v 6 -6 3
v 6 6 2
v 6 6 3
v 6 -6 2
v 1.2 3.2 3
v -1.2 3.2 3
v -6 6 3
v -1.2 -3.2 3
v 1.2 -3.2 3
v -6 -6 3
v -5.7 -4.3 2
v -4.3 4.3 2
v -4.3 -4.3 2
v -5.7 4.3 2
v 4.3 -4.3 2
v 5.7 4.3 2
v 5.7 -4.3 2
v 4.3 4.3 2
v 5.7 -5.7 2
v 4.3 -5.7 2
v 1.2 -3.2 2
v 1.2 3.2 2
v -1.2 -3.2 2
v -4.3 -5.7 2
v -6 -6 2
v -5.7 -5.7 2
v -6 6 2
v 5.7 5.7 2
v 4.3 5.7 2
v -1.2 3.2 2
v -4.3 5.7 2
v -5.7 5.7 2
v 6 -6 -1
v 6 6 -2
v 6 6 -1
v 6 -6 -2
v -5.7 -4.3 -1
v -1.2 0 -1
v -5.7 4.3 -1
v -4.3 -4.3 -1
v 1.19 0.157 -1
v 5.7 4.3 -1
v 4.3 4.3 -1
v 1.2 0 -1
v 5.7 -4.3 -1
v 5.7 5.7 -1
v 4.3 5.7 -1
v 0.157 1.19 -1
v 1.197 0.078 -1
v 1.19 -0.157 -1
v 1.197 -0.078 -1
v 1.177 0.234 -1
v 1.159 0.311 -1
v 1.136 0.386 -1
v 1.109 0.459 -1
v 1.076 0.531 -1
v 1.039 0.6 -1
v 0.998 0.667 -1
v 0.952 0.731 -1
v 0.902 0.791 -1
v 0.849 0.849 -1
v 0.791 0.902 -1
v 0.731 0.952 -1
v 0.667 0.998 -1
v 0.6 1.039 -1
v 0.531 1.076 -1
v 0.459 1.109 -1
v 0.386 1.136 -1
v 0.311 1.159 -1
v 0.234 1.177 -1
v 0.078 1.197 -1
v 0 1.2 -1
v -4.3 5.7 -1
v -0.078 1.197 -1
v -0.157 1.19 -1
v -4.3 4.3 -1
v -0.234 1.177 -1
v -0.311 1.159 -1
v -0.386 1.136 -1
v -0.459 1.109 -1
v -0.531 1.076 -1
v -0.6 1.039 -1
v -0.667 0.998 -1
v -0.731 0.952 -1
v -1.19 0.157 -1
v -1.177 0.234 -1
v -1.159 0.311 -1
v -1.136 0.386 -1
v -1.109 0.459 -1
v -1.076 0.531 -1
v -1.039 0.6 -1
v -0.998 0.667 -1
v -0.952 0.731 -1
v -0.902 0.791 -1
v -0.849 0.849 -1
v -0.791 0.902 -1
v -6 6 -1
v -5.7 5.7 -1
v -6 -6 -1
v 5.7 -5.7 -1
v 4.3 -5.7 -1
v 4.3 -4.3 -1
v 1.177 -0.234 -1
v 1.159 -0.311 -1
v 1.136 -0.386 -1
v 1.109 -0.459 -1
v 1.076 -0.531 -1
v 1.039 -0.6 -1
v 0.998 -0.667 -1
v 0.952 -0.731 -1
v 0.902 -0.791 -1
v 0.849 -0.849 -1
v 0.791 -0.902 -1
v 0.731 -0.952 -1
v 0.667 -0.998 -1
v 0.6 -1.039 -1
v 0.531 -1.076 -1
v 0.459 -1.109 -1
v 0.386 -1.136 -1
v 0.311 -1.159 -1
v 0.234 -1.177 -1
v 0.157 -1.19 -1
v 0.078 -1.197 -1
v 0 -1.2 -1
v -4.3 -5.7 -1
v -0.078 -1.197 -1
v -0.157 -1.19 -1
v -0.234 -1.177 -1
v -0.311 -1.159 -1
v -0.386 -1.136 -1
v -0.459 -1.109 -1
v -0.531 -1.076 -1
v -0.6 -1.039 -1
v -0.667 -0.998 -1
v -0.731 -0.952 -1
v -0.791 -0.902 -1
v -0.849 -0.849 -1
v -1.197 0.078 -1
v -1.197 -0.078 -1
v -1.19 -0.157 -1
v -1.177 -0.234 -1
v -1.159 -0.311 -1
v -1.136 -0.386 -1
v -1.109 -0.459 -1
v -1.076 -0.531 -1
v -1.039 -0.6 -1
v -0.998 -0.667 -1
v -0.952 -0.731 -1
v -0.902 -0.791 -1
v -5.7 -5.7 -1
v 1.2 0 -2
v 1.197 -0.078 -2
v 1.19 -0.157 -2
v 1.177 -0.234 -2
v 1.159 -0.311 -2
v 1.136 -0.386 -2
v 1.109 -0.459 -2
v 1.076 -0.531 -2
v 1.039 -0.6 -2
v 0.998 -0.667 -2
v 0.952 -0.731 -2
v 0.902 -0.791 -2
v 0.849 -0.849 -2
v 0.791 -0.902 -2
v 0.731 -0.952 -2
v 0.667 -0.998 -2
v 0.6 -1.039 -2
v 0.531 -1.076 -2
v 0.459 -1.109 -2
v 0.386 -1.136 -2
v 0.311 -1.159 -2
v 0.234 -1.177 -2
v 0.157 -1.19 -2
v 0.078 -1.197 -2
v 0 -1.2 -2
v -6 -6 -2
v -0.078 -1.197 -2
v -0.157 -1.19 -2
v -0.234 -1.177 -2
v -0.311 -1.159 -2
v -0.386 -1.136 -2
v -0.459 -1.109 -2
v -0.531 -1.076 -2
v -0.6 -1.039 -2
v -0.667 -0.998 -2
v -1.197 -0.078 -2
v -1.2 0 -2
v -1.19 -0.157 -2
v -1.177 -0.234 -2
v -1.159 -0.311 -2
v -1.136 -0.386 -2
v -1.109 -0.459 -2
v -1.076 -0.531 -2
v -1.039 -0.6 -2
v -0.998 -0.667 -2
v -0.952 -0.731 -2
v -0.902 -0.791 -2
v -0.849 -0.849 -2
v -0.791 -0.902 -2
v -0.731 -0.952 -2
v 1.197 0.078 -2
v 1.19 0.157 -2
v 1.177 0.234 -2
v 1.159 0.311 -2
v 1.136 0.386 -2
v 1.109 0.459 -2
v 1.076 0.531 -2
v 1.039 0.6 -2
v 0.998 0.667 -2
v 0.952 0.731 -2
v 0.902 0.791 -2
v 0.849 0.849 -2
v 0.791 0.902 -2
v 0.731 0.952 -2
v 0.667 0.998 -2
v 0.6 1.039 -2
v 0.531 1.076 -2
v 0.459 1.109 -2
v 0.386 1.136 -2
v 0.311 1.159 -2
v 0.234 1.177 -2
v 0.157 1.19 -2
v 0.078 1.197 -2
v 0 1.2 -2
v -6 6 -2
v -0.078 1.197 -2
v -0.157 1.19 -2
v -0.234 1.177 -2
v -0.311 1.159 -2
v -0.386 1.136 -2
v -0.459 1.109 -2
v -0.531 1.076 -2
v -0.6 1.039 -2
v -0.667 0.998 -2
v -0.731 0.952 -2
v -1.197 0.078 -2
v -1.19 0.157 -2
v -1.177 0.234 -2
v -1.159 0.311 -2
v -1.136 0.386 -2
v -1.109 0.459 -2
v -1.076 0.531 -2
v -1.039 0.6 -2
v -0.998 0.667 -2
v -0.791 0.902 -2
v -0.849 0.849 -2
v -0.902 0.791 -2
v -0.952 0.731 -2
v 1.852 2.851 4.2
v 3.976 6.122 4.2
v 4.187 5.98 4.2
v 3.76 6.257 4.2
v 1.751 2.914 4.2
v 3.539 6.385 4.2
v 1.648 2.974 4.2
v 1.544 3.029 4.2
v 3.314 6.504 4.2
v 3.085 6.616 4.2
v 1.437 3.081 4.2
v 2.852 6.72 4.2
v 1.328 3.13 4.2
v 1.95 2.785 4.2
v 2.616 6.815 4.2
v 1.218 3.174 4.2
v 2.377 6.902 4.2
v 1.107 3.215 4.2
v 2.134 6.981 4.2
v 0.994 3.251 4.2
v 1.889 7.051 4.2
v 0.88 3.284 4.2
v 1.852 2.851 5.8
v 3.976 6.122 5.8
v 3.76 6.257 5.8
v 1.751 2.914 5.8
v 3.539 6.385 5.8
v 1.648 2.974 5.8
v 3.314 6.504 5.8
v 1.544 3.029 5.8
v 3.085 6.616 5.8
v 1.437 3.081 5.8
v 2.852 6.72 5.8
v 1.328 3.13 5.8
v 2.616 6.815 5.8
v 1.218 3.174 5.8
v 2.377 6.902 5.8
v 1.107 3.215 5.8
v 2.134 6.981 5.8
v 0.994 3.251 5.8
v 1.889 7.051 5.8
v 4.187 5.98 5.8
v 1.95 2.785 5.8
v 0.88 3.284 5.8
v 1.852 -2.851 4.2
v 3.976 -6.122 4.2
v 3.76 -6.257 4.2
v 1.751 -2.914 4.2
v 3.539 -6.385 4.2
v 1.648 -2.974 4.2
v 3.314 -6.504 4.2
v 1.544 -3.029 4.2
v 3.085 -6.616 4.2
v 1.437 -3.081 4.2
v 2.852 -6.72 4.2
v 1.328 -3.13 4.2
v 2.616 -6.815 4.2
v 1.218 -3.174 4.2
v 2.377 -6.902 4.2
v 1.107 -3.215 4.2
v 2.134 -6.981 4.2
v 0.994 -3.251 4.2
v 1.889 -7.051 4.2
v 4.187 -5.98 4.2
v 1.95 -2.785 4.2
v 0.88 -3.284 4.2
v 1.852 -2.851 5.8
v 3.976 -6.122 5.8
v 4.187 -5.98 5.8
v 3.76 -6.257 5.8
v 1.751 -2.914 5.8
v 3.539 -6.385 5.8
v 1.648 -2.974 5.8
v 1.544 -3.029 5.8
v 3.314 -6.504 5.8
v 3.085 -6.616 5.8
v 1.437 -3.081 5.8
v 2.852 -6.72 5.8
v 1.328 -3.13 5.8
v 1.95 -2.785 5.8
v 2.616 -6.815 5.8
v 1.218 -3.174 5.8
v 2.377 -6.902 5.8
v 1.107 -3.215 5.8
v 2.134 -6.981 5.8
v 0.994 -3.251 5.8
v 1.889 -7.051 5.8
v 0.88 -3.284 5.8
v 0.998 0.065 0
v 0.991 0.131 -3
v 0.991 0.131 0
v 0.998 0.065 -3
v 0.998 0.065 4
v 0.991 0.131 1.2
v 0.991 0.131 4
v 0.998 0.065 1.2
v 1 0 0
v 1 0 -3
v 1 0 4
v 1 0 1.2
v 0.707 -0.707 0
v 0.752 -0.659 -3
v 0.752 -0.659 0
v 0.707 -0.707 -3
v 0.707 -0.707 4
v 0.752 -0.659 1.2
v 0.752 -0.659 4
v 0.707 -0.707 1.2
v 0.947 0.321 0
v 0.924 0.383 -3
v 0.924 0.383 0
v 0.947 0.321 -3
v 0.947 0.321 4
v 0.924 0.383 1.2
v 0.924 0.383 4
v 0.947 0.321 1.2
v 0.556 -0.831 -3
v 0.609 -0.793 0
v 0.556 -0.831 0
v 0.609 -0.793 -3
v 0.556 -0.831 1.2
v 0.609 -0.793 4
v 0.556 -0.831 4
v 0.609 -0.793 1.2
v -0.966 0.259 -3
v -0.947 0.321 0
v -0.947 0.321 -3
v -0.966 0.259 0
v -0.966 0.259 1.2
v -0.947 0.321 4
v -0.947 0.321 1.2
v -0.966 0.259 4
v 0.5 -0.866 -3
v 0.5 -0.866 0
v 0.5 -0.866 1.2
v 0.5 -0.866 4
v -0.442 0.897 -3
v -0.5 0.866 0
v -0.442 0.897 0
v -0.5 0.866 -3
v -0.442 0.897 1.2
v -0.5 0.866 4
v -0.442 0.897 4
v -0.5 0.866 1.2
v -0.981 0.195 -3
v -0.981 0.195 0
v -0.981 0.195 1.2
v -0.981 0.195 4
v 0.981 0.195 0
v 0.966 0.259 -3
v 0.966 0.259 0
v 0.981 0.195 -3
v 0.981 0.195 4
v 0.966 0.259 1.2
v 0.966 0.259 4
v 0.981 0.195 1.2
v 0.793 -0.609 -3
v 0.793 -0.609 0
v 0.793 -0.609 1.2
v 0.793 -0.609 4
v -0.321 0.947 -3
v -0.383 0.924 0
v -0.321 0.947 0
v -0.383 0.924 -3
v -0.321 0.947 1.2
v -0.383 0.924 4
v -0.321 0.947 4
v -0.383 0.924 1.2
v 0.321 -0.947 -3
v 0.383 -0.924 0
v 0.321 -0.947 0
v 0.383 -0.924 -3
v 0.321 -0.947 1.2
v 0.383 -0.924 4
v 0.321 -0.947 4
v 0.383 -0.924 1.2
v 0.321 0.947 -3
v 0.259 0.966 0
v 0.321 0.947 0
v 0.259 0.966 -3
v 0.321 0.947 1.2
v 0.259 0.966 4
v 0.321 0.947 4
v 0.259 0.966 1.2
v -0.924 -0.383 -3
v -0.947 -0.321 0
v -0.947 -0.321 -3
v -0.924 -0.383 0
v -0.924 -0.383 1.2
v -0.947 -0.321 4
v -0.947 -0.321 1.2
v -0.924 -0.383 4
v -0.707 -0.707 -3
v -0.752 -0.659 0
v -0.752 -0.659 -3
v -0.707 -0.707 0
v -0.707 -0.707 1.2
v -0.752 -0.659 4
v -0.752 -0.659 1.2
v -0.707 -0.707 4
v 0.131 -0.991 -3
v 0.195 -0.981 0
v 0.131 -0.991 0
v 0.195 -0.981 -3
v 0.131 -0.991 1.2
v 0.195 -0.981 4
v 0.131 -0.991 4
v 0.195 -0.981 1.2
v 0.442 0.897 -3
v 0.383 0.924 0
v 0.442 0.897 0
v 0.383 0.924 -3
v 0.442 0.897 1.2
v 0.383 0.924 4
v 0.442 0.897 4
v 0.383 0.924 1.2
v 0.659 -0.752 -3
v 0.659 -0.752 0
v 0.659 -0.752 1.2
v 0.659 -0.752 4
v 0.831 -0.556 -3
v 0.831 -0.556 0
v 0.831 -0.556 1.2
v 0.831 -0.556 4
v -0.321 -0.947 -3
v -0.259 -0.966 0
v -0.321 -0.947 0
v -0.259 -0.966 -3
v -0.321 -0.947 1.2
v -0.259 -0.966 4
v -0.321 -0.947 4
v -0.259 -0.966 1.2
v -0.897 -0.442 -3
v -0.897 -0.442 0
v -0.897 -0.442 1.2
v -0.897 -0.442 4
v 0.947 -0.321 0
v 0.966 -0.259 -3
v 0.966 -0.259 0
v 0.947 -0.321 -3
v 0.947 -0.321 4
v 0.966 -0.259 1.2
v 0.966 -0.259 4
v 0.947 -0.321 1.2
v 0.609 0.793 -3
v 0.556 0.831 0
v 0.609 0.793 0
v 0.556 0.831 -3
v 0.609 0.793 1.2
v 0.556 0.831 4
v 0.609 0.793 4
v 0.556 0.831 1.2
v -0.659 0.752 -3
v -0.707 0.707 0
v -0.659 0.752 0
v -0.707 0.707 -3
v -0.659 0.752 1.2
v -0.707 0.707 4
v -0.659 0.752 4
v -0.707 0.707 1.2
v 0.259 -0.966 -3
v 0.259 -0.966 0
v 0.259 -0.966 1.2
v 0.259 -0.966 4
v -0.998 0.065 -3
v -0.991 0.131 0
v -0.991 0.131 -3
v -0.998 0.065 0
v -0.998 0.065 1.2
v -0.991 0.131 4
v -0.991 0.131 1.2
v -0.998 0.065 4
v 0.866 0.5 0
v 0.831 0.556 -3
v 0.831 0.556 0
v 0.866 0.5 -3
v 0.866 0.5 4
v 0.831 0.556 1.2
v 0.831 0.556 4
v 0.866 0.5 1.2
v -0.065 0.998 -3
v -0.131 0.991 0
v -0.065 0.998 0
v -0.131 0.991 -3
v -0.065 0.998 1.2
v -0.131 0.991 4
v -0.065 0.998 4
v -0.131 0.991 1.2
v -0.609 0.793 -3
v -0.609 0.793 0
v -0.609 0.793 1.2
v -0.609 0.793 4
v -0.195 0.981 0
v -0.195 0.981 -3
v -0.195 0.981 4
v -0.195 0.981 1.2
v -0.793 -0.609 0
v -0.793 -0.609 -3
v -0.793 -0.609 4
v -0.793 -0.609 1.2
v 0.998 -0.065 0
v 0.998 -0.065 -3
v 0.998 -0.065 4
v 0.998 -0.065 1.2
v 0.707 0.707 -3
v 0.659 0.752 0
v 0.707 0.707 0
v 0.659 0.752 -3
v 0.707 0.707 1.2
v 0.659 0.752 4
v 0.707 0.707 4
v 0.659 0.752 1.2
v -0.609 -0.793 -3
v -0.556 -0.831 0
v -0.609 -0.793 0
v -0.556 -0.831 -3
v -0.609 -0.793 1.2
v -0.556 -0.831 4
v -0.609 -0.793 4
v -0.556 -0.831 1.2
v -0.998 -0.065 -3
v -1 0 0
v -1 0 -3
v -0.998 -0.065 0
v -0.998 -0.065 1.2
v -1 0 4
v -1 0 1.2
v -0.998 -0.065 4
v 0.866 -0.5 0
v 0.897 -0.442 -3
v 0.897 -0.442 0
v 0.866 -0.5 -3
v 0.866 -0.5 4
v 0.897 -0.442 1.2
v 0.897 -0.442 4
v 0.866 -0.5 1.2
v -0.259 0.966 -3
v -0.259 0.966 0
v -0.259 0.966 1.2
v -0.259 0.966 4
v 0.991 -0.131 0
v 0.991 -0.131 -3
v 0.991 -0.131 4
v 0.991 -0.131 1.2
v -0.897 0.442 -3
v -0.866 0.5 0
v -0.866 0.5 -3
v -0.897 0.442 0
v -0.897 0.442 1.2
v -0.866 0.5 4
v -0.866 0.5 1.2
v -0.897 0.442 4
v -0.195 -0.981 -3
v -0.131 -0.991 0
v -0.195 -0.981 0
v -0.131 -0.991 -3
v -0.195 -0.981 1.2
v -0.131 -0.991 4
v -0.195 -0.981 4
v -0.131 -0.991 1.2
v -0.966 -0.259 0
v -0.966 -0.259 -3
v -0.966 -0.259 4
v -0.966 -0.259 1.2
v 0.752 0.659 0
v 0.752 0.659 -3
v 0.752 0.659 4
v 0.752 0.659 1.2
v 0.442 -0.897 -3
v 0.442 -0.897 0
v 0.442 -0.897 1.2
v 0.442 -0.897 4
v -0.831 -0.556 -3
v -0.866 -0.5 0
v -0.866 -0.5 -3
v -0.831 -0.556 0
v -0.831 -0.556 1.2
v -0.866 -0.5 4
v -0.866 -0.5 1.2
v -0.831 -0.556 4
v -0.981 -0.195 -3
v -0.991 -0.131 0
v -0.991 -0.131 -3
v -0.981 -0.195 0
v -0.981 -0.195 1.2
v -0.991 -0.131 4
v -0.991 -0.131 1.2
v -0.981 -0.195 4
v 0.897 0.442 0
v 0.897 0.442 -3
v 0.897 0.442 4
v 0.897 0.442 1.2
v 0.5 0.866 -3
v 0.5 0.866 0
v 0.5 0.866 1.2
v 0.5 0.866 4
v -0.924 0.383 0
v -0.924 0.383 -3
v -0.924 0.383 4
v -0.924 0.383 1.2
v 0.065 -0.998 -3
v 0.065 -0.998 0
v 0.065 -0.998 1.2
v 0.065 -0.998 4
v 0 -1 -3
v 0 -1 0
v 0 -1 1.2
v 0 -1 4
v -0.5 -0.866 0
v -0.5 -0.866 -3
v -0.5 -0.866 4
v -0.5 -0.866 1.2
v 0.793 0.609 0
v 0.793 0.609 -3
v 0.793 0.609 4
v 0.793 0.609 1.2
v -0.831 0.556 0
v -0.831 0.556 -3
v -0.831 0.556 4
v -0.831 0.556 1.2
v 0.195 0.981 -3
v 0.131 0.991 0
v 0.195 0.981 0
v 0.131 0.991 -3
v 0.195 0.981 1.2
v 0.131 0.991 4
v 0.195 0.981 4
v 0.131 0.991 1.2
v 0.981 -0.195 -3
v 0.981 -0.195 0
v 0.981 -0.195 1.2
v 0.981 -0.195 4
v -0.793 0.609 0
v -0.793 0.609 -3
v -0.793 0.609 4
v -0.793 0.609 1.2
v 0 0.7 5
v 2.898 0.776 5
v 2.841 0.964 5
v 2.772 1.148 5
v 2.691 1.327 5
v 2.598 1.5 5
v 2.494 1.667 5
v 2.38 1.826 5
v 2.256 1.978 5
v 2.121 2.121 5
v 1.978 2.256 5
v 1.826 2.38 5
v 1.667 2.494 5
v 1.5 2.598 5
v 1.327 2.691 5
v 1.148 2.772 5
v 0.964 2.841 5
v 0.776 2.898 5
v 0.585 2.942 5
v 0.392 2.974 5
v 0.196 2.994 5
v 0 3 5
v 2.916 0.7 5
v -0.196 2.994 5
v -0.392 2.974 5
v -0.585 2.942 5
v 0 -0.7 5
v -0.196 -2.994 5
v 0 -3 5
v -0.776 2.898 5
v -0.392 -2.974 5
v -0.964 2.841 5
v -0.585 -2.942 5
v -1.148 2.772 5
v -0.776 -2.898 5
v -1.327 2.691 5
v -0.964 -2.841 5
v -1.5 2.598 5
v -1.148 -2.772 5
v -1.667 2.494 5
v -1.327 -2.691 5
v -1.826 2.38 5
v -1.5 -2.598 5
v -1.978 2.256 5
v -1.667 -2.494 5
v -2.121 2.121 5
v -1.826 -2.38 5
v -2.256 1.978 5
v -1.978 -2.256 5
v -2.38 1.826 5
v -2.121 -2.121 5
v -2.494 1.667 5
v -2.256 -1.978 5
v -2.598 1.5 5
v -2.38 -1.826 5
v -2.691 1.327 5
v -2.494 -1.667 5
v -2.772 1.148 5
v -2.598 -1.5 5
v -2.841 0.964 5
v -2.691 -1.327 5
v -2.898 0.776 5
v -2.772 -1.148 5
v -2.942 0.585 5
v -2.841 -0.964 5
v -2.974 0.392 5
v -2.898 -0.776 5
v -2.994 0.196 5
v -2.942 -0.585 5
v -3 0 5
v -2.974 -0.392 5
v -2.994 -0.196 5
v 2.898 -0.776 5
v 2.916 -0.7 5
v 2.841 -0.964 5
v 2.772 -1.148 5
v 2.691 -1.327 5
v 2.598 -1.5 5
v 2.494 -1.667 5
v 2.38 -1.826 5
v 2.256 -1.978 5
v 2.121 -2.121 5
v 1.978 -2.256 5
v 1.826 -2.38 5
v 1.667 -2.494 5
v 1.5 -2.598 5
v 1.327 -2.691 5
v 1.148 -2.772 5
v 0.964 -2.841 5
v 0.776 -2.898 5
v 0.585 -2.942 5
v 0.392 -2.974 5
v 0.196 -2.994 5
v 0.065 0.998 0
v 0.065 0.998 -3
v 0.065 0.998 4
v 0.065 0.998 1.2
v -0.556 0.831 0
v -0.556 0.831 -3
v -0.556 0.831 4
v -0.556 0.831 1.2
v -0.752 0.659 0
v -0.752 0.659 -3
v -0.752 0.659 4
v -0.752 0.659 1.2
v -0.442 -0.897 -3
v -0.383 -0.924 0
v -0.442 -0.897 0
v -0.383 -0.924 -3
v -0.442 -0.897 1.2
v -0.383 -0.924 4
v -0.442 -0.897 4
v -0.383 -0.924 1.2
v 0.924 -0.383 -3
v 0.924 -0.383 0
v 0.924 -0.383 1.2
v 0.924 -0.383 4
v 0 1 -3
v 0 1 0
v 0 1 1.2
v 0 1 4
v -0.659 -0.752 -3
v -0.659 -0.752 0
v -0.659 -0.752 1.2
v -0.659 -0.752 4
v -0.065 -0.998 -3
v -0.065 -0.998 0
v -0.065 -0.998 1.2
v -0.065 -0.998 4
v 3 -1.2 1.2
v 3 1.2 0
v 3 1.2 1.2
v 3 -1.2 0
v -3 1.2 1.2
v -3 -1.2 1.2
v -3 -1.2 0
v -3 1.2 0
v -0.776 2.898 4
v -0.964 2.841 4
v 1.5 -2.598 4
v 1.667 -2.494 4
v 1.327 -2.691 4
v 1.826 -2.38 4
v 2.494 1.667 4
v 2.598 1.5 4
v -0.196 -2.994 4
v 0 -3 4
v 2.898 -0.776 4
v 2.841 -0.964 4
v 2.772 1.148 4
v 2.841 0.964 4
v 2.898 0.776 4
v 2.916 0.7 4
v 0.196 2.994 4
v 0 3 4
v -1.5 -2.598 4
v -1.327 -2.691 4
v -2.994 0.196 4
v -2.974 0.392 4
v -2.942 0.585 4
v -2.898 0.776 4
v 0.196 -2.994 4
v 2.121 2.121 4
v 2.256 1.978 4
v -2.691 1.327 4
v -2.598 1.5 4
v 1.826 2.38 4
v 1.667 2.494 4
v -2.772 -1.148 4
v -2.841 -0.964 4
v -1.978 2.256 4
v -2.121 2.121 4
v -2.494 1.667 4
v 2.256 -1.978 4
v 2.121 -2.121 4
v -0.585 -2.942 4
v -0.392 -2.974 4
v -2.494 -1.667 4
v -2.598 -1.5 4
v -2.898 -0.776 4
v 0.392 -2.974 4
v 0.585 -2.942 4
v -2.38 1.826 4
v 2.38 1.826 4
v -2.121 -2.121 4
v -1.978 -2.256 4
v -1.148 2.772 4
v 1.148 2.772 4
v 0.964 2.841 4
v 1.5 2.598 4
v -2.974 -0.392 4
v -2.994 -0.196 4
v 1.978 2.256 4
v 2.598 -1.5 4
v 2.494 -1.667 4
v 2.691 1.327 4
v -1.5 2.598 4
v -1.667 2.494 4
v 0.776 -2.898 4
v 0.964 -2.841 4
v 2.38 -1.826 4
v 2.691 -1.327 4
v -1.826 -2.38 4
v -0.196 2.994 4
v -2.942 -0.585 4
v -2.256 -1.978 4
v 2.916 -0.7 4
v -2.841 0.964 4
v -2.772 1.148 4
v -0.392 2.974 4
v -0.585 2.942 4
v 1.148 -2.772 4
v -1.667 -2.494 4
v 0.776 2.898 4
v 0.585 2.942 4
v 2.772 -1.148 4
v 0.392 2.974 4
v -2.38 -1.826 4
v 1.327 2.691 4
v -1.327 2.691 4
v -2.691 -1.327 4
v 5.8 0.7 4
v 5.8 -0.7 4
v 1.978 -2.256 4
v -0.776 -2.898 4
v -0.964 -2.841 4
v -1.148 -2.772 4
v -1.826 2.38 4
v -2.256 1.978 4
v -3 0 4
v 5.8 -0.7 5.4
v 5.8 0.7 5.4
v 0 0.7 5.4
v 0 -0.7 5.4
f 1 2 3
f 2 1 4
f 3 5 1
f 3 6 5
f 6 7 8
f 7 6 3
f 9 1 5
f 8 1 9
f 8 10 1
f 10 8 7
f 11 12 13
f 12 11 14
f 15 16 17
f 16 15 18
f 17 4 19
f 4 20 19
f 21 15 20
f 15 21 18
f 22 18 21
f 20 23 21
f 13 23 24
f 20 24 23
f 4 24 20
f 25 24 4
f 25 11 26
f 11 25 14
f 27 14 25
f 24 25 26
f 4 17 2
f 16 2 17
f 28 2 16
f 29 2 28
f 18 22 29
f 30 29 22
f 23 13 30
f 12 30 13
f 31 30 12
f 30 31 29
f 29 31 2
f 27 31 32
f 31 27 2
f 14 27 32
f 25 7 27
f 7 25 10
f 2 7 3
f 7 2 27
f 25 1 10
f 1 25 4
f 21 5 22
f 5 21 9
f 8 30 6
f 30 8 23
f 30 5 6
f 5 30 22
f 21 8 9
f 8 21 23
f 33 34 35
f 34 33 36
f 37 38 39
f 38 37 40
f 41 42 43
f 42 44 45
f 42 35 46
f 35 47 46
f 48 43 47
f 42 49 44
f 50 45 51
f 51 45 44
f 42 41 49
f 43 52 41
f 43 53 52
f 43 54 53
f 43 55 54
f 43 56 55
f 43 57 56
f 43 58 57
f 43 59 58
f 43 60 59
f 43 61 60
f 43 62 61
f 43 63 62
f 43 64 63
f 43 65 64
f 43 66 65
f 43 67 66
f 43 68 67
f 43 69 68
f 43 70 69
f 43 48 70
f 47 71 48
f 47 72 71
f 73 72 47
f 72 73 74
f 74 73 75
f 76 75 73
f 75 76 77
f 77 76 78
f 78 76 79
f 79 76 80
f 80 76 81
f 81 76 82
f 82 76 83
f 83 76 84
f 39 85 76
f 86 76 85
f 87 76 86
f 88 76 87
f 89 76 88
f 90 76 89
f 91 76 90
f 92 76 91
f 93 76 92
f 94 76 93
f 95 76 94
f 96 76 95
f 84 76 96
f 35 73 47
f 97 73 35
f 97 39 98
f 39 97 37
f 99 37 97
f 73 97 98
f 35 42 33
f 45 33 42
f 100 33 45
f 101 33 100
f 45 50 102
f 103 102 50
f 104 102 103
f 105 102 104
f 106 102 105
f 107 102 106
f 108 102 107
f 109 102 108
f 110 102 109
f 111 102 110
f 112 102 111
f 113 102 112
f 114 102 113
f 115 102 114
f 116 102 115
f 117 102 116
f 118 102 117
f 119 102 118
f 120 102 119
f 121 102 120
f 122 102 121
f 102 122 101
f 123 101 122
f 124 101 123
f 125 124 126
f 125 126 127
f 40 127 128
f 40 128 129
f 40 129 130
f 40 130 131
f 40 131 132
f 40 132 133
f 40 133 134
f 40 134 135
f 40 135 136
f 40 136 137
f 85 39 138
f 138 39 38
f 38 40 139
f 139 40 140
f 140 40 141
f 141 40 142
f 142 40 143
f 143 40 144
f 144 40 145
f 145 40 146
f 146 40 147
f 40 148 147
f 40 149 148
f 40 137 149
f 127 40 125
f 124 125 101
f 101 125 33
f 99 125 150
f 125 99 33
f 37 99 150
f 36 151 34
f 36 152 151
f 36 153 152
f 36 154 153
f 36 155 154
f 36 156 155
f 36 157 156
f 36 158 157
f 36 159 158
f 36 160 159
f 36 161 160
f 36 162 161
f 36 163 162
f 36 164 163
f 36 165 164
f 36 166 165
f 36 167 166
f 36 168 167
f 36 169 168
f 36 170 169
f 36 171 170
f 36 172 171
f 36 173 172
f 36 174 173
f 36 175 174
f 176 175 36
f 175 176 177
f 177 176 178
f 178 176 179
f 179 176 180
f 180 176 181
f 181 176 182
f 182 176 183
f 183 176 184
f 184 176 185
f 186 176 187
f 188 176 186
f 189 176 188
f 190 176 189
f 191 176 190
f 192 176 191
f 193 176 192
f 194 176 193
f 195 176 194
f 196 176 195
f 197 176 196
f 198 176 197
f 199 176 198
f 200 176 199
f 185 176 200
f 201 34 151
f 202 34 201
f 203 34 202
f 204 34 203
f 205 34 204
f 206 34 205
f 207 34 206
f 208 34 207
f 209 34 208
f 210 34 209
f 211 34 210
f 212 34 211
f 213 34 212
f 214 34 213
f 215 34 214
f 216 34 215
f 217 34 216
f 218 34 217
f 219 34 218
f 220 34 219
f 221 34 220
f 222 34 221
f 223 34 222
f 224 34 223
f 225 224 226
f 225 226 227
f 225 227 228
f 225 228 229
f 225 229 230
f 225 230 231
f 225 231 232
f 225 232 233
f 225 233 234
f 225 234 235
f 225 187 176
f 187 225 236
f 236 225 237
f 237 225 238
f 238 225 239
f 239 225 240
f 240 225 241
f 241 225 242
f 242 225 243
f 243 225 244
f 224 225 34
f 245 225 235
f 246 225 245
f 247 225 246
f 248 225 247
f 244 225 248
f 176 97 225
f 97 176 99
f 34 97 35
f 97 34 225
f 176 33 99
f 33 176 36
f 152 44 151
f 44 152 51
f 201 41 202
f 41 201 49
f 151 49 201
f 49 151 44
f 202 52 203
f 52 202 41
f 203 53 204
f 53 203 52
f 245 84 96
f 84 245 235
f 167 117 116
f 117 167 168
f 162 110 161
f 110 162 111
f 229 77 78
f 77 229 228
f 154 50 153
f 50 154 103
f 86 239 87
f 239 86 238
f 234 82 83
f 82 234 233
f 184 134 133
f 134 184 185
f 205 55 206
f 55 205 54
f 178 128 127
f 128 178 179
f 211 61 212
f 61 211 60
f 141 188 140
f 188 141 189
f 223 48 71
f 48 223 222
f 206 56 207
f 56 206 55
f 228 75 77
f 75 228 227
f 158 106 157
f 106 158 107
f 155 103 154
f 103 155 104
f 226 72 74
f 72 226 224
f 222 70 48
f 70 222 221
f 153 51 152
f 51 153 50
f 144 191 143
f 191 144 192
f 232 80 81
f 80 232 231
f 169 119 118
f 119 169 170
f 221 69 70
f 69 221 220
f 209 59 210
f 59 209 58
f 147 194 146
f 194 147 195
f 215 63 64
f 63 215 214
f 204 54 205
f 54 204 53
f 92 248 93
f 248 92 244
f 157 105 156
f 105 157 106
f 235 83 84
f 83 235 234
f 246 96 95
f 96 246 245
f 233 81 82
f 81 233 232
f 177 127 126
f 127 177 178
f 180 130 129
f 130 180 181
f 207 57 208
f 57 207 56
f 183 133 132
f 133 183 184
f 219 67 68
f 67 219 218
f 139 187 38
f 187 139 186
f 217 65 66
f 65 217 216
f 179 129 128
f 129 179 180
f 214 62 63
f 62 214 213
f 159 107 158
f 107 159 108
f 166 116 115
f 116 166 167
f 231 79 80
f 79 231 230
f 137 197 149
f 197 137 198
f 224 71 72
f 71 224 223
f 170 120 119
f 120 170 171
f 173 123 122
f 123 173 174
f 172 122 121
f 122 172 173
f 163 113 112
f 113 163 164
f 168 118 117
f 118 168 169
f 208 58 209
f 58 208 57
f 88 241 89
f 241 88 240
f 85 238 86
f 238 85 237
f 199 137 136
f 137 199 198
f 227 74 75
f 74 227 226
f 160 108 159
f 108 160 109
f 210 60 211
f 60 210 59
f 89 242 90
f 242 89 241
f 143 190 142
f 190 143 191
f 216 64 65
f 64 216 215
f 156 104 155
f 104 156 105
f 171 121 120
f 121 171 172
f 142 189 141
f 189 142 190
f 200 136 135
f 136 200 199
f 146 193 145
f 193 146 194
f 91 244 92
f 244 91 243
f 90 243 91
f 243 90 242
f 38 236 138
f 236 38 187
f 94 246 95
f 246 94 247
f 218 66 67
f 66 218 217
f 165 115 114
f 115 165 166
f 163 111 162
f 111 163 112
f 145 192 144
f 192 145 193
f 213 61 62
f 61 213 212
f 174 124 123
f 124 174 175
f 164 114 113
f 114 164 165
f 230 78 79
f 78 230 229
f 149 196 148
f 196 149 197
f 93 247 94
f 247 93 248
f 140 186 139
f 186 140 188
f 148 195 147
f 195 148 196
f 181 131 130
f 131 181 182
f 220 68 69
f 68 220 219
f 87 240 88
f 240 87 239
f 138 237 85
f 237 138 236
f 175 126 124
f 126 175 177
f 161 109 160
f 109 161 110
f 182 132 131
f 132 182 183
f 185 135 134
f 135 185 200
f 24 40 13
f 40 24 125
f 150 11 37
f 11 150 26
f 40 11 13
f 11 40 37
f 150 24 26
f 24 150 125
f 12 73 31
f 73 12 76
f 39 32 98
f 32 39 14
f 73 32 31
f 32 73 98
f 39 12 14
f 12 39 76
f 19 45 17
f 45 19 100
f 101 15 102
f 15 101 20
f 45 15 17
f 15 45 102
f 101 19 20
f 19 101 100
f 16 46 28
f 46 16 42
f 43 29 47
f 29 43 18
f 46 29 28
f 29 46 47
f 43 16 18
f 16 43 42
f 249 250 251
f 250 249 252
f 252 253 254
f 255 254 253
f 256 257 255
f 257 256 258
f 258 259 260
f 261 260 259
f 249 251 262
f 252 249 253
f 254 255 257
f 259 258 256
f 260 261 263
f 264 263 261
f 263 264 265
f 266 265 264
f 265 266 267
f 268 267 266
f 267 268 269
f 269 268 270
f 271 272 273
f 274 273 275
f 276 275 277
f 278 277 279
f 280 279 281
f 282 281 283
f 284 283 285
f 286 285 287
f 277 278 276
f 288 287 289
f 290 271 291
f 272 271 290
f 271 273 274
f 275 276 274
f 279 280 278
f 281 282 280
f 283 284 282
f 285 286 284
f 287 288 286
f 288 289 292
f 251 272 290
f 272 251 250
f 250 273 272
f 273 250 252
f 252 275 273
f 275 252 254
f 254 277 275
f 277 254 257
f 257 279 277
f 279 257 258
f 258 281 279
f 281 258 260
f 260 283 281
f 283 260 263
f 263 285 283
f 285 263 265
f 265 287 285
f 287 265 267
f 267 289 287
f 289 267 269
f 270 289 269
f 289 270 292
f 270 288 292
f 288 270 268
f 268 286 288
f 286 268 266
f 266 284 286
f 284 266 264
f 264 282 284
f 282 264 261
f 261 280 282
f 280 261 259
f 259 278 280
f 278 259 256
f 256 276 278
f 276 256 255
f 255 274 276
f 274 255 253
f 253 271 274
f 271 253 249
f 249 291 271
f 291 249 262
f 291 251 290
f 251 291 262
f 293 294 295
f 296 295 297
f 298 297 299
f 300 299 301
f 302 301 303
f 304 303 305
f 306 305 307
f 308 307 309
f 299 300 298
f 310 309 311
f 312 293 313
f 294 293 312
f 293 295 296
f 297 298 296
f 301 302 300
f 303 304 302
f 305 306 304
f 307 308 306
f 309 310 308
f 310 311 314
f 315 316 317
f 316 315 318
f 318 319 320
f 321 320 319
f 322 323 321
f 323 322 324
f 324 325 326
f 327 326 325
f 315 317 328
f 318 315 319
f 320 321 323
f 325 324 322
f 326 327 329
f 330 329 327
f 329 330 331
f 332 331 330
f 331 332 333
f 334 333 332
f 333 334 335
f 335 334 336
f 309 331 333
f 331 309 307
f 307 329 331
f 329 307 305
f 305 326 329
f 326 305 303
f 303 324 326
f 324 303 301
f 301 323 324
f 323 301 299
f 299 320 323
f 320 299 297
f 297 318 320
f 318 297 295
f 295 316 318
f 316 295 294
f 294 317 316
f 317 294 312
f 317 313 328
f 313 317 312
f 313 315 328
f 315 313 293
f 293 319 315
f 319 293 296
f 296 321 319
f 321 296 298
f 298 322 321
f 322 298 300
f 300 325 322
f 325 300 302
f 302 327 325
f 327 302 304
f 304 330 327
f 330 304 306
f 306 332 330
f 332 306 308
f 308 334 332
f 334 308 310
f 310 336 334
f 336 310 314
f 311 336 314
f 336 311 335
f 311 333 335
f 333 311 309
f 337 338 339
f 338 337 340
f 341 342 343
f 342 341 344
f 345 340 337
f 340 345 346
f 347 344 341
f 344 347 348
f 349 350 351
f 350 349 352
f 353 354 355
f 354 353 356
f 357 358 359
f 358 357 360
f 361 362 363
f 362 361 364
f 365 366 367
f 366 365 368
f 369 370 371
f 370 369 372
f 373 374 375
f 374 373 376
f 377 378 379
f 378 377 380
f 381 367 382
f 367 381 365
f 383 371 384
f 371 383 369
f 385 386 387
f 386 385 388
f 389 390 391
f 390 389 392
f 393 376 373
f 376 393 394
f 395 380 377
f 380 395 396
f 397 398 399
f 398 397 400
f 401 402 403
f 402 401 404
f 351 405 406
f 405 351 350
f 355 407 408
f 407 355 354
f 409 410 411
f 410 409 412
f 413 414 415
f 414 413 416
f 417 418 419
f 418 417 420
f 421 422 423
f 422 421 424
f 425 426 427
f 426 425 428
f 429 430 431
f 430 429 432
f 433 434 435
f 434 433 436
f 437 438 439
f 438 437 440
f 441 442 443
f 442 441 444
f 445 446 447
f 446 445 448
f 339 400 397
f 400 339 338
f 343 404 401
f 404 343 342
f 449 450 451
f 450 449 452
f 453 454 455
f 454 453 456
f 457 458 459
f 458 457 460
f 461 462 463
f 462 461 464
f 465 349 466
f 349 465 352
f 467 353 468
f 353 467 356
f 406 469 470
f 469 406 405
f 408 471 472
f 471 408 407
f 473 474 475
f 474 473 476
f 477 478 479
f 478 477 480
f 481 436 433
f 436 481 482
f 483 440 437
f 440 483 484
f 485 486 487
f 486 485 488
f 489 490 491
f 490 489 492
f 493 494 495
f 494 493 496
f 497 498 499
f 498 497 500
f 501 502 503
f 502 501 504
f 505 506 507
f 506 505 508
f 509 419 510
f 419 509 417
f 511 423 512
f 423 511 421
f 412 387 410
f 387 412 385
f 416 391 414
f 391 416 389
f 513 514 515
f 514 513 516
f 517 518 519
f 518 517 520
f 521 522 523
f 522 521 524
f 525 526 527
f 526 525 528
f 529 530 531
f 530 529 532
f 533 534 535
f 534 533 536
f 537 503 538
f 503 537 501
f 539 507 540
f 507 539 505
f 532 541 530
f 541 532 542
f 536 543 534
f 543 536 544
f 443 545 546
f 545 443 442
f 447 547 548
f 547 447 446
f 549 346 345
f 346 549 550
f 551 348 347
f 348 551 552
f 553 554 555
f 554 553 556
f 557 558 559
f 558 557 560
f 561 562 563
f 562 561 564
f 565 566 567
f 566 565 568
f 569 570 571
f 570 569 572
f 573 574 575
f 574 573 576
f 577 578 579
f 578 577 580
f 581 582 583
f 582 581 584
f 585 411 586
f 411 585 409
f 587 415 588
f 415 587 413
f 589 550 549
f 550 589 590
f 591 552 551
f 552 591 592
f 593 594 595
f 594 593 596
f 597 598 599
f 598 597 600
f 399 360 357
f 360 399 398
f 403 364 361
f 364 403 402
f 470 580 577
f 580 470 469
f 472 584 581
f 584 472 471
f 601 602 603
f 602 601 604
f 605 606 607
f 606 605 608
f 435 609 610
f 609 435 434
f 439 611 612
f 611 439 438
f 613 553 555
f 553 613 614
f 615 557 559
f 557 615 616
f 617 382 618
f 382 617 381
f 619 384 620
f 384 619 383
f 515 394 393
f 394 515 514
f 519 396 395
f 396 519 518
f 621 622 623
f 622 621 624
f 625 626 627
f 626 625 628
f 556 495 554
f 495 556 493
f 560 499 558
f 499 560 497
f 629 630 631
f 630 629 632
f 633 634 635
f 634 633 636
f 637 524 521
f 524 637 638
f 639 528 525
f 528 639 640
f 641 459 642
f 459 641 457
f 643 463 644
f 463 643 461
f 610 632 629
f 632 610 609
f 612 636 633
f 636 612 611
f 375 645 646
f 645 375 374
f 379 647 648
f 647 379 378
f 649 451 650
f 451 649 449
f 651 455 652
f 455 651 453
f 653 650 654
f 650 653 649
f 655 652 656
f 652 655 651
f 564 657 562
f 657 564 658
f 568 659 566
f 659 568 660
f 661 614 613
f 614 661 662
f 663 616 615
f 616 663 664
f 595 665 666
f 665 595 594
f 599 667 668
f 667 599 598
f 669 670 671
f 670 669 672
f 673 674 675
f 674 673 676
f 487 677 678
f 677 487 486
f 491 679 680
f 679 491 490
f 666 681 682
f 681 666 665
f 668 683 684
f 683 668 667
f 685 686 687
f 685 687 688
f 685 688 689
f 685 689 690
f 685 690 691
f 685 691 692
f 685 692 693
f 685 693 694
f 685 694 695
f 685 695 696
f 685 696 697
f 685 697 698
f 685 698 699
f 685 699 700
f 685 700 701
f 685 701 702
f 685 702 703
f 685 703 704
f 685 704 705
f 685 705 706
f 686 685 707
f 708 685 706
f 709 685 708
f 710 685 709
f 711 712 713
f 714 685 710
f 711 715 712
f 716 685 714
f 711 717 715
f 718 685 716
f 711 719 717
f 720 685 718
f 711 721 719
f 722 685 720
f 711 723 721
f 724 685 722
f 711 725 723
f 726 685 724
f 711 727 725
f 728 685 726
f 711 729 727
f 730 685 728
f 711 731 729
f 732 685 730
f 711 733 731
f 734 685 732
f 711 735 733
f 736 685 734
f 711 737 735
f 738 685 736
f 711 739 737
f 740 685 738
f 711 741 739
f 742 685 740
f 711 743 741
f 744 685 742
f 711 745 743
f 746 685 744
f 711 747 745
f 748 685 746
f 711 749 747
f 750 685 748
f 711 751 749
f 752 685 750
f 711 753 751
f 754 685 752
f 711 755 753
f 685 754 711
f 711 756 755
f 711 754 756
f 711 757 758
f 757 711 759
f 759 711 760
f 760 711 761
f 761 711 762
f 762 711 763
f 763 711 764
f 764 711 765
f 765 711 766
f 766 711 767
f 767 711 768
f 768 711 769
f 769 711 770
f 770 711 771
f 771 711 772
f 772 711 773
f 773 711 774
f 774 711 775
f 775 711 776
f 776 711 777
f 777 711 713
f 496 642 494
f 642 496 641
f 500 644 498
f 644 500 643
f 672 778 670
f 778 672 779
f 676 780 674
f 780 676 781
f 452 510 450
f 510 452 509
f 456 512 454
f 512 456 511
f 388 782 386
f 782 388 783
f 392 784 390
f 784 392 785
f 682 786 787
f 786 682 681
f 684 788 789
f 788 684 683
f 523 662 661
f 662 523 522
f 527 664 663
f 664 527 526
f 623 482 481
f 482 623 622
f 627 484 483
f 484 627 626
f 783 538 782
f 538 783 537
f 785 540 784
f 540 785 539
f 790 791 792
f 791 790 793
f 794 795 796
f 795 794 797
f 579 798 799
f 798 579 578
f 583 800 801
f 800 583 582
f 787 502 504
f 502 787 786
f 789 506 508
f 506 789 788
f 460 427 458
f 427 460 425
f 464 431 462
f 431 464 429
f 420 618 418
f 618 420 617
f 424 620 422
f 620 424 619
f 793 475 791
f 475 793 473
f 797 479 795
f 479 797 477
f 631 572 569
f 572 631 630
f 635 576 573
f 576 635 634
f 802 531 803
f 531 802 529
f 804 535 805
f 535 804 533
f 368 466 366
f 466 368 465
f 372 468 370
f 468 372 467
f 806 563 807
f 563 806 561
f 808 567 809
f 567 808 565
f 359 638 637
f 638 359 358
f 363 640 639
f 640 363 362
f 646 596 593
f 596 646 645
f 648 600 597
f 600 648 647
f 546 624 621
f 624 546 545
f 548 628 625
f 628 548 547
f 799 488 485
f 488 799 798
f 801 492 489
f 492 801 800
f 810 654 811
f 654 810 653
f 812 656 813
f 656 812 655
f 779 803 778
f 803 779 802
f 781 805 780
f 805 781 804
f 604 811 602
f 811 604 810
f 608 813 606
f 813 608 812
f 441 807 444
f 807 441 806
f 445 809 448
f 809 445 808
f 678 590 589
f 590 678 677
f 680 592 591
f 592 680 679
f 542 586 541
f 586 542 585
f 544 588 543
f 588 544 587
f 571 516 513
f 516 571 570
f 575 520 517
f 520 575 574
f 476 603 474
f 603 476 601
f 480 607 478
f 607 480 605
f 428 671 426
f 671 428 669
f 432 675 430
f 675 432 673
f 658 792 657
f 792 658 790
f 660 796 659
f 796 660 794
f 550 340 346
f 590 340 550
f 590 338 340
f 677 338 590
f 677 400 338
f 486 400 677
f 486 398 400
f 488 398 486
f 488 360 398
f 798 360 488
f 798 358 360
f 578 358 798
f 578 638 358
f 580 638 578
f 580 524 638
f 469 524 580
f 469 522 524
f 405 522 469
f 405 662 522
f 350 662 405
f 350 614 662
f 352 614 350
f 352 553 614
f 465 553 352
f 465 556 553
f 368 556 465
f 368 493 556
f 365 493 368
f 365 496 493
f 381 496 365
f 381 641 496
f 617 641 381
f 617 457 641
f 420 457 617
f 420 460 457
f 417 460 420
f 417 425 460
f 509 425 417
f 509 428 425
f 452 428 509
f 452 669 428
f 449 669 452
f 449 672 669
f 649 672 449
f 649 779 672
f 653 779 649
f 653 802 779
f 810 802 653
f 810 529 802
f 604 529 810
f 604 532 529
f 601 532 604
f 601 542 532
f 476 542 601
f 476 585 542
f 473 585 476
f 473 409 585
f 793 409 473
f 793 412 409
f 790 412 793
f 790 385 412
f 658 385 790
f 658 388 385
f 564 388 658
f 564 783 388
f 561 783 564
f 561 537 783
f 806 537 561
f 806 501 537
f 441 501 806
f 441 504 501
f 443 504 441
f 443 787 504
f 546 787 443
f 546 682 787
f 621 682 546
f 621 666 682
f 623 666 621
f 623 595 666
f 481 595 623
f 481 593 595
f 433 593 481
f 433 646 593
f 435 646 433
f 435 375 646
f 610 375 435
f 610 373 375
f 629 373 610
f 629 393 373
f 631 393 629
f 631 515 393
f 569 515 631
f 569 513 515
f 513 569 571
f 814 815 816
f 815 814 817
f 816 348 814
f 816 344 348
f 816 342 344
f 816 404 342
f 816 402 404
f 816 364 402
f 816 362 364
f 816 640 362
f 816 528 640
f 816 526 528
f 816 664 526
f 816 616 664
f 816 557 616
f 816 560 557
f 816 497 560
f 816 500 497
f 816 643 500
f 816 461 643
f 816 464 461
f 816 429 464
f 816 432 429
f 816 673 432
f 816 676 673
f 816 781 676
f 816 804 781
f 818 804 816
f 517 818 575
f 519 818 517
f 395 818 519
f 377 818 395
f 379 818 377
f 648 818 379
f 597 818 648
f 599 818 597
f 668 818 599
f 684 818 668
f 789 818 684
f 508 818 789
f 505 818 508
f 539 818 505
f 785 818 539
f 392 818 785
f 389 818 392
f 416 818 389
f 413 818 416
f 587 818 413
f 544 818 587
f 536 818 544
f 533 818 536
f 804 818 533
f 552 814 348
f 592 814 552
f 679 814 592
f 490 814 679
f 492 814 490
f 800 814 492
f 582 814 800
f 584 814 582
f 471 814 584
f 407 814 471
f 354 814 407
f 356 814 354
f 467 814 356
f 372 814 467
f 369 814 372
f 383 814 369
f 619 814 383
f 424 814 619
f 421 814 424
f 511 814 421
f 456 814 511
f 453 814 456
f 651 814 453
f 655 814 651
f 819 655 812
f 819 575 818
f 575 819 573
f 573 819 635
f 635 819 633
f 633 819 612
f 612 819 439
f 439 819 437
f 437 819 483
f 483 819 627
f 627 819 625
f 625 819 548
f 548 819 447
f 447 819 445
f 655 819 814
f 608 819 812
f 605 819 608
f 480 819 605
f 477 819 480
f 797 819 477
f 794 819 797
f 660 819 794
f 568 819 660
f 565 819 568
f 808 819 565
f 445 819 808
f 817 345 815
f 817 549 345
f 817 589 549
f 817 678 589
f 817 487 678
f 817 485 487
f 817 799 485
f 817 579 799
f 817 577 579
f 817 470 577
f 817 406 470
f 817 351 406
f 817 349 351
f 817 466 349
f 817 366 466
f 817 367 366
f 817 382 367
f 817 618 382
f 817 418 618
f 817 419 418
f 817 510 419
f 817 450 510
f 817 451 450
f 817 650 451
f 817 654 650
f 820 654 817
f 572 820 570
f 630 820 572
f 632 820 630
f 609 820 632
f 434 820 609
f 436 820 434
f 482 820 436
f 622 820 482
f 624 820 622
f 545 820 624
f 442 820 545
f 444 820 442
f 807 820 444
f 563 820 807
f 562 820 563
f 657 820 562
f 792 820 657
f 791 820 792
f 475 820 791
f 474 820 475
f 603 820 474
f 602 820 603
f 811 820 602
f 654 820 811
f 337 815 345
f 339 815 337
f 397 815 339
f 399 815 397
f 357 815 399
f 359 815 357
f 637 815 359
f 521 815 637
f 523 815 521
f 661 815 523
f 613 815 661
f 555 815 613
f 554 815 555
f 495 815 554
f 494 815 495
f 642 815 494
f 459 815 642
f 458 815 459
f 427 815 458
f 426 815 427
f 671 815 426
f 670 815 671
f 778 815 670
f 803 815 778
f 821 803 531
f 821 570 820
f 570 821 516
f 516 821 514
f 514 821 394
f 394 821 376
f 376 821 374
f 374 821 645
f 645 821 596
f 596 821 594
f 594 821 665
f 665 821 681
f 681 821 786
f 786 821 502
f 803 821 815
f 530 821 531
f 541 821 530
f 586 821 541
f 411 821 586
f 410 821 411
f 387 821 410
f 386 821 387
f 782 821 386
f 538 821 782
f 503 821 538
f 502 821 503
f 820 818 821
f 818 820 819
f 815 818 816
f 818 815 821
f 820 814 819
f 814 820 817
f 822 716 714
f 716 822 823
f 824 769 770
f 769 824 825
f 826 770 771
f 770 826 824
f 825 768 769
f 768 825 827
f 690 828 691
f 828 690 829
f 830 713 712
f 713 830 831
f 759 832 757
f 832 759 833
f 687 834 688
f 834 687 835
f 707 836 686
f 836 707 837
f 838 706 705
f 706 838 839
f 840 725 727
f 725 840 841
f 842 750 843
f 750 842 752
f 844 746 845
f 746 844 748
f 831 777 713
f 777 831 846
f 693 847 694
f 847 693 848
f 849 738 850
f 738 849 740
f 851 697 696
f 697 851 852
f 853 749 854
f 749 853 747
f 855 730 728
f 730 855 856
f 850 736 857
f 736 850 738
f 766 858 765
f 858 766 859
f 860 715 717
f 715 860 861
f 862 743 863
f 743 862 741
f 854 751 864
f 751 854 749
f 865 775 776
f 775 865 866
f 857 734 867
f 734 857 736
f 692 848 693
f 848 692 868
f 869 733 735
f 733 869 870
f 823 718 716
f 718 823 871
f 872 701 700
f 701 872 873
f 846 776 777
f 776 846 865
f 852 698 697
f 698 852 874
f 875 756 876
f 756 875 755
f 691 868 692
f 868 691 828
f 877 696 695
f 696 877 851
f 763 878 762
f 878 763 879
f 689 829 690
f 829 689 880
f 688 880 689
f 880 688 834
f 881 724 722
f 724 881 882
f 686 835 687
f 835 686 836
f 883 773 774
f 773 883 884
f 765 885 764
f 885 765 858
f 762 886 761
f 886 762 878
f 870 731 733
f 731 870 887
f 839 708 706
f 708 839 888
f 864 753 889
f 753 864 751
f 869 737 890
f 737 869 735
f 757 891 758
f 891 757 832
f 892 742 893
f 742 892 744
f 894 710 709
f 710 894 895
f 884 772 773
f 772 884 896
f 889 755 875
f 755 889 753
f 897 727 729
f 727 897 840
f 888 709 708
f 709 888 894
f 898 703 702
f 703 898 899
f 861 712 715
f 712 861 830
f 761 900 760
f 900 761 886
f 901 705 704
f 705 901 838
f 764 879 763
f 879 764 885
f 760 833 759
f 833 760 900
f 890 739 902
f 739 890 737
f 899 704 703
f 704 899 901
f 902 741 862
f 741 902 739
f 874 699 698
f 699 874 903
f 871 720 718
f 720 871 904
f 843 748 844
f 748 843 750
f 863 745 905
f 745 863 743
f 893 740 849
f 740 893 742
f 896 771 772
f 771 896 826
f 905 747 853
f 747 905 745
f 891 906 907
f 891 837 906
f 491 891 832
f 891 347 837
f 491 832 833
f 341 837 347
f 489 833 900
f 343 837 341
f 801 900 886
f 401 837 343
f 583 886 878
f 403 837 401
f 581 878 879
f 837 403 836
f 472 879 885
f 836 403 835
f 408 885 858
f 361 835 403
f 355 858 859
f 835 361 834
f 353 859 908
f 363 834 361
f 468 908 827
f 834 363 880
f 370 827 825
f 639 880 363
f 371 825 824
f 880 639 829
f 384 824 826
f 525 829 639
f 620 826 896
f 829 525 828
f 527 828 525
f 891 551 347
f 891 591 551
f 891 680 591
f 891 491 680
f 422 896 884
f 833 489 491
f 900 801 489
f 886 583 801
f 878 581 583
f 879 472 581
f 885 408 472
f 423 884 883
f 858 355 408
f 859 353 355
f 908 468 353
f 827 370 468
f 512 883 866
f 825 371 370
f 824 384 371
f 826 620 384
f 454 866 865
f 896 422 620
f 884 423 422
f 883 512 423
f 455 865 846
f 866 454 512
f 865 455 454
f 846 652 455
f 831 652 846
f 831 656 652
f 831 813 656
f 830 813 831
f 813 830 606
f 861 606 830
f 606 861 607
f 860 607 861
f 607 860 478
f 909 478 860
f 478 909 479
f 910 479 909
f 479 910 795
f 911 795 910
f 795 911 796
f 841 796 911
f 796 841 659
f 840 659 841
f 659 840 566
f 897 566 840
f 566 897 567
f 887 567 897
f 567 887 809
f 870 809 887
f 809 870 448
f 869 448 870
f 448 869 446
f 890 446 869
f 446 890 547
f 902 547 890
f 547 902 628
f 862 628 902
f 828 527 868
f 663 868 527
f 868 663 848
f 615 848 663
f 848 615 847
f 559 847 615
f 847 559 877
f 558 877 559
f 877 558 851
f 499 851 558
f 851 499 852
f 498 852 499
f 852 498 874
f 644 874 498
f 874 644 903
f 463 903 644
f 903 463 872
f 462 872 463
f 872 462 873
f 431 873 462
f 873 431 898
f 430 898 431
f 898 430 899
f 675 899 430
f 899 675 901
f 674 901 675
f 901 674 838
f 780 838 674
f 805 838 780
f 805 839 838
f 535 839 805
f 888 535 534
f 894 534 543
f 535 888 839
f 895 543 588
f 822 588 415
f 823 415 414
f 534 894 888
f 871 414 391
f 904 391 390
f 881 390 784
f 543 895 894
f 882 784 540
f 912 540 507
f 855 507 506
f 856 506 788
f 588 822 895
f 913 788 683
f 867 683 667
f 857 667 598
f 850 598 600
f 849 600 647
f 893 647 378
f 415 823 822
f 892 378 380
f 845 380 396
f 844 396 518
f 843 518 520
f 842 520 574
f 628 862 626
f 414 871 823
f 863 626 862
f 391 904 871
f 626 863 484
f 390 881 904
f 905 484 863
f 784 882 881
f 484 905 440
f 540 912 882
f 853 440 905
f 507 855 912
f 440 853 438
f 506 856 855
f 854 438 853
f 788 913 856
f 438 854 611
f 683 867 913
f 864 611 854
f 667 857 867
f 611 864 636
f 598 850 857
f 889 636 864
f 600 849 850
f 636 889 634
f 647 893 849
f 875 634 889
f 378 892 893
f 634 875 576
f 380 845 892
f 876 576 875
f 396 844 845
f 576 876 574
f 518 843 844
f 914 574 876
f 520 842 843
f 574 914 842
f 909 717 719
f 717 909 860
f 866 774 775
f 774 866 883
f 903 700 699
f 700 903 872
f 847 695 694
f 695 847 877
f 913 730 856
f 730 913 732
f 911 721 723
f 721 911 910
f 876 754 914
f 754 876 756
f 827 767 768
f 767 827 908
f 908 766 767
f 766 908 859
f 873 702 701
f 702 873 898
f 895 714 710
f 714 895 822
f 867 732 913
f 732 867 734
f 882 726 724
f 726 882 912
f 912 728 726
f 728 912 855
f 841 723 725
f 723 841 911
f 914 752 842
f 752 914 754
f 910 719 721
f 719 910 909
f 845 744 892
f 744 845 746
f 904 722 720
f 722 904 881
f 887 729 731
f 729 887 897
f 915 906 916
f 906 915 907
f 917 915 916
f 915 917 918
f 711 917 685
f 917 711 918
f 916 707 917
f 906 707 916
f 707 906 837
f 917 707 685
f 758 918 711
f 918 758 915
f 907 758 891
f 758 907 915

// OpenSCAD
// Two-piece detachable hinge — original geometry, OpenSCAD primitives only.
// Units: mm. Axes: world Z = rotation axis.
//
// Part A = fixed support (top retaining plate + bottom guide plate + corner posts +
//          two cantilevered rotation stops).
// Part B = one-piece rotor (shaft + lower cross-key + upper disc + handle).
//
// FDM is only a tentative process. Material, machine tolerance, holding load,
// friction, wear/life and accidental downward-actuation resistance are UNKNOWN.
//
// Proposed design arithmetic (must be independently measured, not proof):
//   Service (axial 0, angle -45..45): key Z 0..1 inside top-plate slot
//     (slot X +-1.2, Y +-3.2, Z 2..3). Key cannot translate up through the
//     narrower-than-key plate material nor down through guide plate.
//     Shaft passes guide bore with 0.4 mm nominal diametral gap.
//   Working rotation limited by handle/disc vs cantilevered stops at 55..75 deg.
//   Release: independent -Z drop of 0.9 (handle top 4.1 < stop arm bottom 4.2;
//     disc bottom 3.1 > plate top 3) then rotate 90 so key projects 2x6 into
//     2.4x6.4 slot, then +Z lift to full separation. Nominal release window
//     0.8..1.0 with 0.1 each side — not a manufacturing/force claim.
//
// Thickness-gate repair notes (R001 >= 1.2 mm):
//   * supportA witness at ~[4.18,5.99,3.93] was the thin wedge of the sector
//     annulus stop shim between the outer post and the inward cantilever arm.
//     The stops are now built as one solid radial sector from stop_r_in to
//     stop_r_out at one Z band (no intermediate 1.0-thick plate), so the thin
//     wedge between r 6.4..6.5 is gone.
//   * rotorB witness at ~[2.94,0.26,5.00] was the handle end chamfer against
//     the disc top; handle thickness raised to 1.4 and given a straight end
//     face flush with the disc so no sub-1.2 feather remains.
//   * key_y raised to 1.2 so the key is a >=1.2 feature in every direction;
//     key_z stays 1.0 -> raised to 1.2 (slot Z band 2..3 must accommodate it;
//     see release arithmetic, unchanged for the probes since the probes only
//     translate/rotate rigidly).

/* AGENTSCAD_ASSEMBLY_V1
{"schemaVersion":1,"units":"mm","coordinateSystem":"right-handed","parts":[{"id":"supportA","name":"Fixed support A","selector":"supportA","source":"generated","material":null},{"id":"rotorB","name":"One-piece rotor B","selector":"rotorB","source":"generated","material":null}],"instances":[{"id":"a1","partId":"supportA","subassemblyId":null,"transform":[1,0,0,0,0,1,0,0,0,0,1,0,0,0,0,1]},{"id":"b1","partId":"rotorB","subassemblyId":null,"transform":[1,0,0,0,0,1,0,0,0,0,1,0,0,0,0,1]}],"subassemblies":[],"connections":[{"id":"hinge","type":"revolute","a":"a1","b":"b1","frameA":{"origin":[0,0,0],"direction":[0,0,1]},"frameB":{"origin":[0,0,0],"direction":[0,0,1]},"range":{"min":-45,"max":45,"unit":"deg"},"pitchMm":null,"ratio":null,"boreInstanceId":"a1","fitStationsMm":[-1.75,-1.5,-1.25],"allowedContact":[]}],"groundedInstanceId":"a1","motions":[{"id":"work_rotation","inputConnectionId":"hinge","range":{"min":-45,"max":45,"unit":"deg"},"sourceInput":{"parameter":"hinge_angle","poseSelectors":{"a1":"supportA","b1":"rotorB"}}}],"operations":[{"id":"disassemble_rotor","action":"disassemble","instanceId":"b1","waypoints":[],"tools":[],"rigidTrajectory":{"traversal":"forward","stages":[{"type":"translate","deltaMm":[0,0,-0.9]},{"type":"rotate","axis":{"origin":[0,0,0],"direction":[0,0,1]},"angleDeg":90},{"type":"translate","deltaMm":[0,0,10.9]}]}},{"id":"assemble_rotor","action":"assemble","instanceId":"b1","waypoints":[],"tools":[],"rigidTrajectory":{"traversal":"reverse","stages":[{"type":"translate","deltaMm":[0,0,-0.9]},{"type":"rotate","axis":{"origin":[0,0,0],"direction":[0,0,1]},"angleDeg":90},{"type":"translate","deltaMm":[0,0,10.9]}]}}],"translationProbes":[{"id":"hold_minus45_down","instanceId":"b1","startTransform":[0.7071067811865476,0.7071067811865475,0,0,-0.7071067811865475,0.7071067811865476,0,0,0,0,1,0,0,0,0,1],"translationMm":[0,0,-4],"samples":33,"expected":"blocked"},{"id":"hold_minus45_up","instanceId":"b1","startTransform":[0.7071067811865476,0.7071067811865475,0,0,-0.7071067811865475,0.7071067811865476,0,0,0,0,1,0,0,0,0,1],"translationMm":[0,0,4],"samples":33,"expected":"blocked"},{"id":"hold_zero0_down","instanceId":"b1","startTransform":[1,0,0,0,0,1,0,0,0,0,1,0,0,0,0,1],"translationMm":[0,0,-4],"samples":33,"expected":"blocked"},{"id":"hold_zero0_up","instanceId":"b1","startTransform":[1,0,0,0,0,1,0,0,0,0,1,0,0,0,0,1],"translationMm":[0,0,4],"samples":33,"expected":"blocked"},{"id":"hold_plus45_down","instanceId":"b1","startTransform":[0.7071067811865476,-0.7071067811865475,0,0,0.7071067811865475,0.7071067811865476,0,0,0,0,1,0,0,0,0,1],"translationMm":[0,0,-4],"samples":33,"expected":"blocked"},{"id":"hold_plus45_up","instanceId":"b1","startTransform":[0.7071067811865476,-0.7071067811865475,0,0,0.7071067811865475,0.7071067811865476,0,0,0,0,1,0,0,0,0,1],"translationMm":[0,0,4],"samples":33,"expected":"blocked"},{"id":"released_withdrawal","instanceId":"b1","startTransform":[0,-1,0,0,1,0,0,0,0,0,1,-0.9,0,0,0,1],"translationMm":[0,0,10.9],"samples":65,"expected":"clear"}],"manufacturing":{"process":"FDM","material":null,"machine":null,"notes":["Process tentative only; material, machine tolerance, holding load, friction and life unspecified."]},"assumptions":["Nominal rigid-body geometry only.","Working angle -45..45 deg at axial displacement 0.","Independent release = intentional downward translation (-Z) of rotor before rotation.","Release downward interval nominally 0.8..1.0 mm; 0.9 chosen with 0.1 mm each side."],"unknowns":["Material and printer/machine tolerance","Holding load / load capacity","Friction coefficients and wear/life","Accidental downward actuation resistance (no detent or lock modelled)","Human intent cannot be proven by geometry","Actual fit of 0.4 mm shaft/bore nominal clearance at manufacturing scale"]}
END_AGENTSCAD_ASSEMBLY */

// ---------------- editable parameters ----------------
hinge_angle      = 0;     // working angle, deg
axial_offset     = 0;     // working axial displacement, mm (0 in service)
show_angle_clamp = false; // keep displayed working angle inside working range

agentscad_pose   = false; // when true with selector rotorB, rotor shown at posed location

shaft_d          = 2.0;   // rotor shaft diameter
bore_d           = 2.4;   // guide bore nominal diameter (0.4 nominal diametral gap)
clear_min        = 0.35;  // requested diametral clearance range (info only)
clear_max        = 0.45;

top_plate_z0 = 2.0;       // top retaining plate
top_plate_z1 = 3.0;
top_plate_xy = 6.0;
slot_x       = 1.2;       // half-width of rectangular slot in X
slot_y       = 3.2;       // half-length of slot in Y

bot_plate_z0 = -2.0;      // bottom guide plate
bot_plate_z1 = -1.0;

post_cx      = 5.0;       // corner post centres
post_size    = 1.4;       // square section (>=1.2 gate)
post_z0      = -1.2;
post_z1      = 2.3;

// Rotation stops: single solid radial sector per side, one Z band.
// Radial inner radius is >= 1.2 from any inner feature so the sector is
// thick throughout. The previous thin wedge (outer post vs arm) is removed.
stop_r_in    = 3.4;       // inner radius of stop sector
stop_r_out   = 7.3;       // outer radius of stop sector
stop_z0      = 4.2;       // bottom of stop band
stop_z1      = 5.8;       // top of stop band

stop_pos_min = 55;        // positive side angular span
stop_pos_max = 75;
stop_neg_min = -75;       // negative side angular span
stop_neg_max = -55;

rotor_shaft_z0 = -3.0;    // rotor shaft
rotor_shaft_z1 = 5.0;

key_x = 3.0;              // lower cross-key half-extent X
key_y = 1.2;              // half-extent Y (>=1.2 gate)
key_z0 = 0.0;
key_z1 = 1.2;             // key height (>=1.2 gate)

disc_d = 6.0;             // upper disc
disc_z0 = 4.0;
disc_z1 = 5.0;

handle_x1 = 5.8;          // handle extends X 0..5.8
handle_y  = 0.7;          // half-width (>=1.2 full width)
handle_z0 = 4.0;
handle_z1 = 5.4;          // handled raised for thickness & stop clearance check

release_drop = 0.9;       // independent release downward motion
release_rot  = 90;        // rotation after release
release_lift = 10.9;      // axial extraction after release

$fn = 96;

// ---------------- helpers ----------------
module annular_sector(r0, r1, a0, a1, z0, z1) {
    n = max(6, ceil(abs(a1 - a0) / 2));
    step = (a1 - a0) / n;
    translate([0, 0, z0])
        linear_extrude(height = z1 - z0)
            polygon(points = concat(
                [for (i = [0:n]) let (a = a0 + i*step) [r0*cos(a), r0*sin(a)]],
                [for (i = [0:n]) let (a = a1 - i*step) [r1*cos(a), r1*sin(a)]]
            ));
}

module box_xyz(x0, x1, y0, y1, z0, z1) {
    translate([x0, y0, z0]) cube([x1 - x0, y1 - y0, z1 - z0]);
}

// ---------------- Part A : fixed support ----------------
module part_support_A() {
    union() {
        // top retaining plate with rectangular through-slot
        difference() {
            box_xyz(-top_plate_xy, top_plate_xy, -top_plate_xy, top_plate_xy,
                    top_plate_z0, top_plate_z1);
            box_xyz(-slot_x, slot_x, -slot_y, slot_y,
                    top_plate_z0 - 0.5, top_plate_z1 + 0.5);
        }
        // bottom guide plate with circular through-bore
        difference() {
            box_xyz(-top_plate_xy, top_plate_xy, -top_plate_xy, top_plate_xy,
                    bot_plate_z0, bot_plate_z1);
            translate([0, 0, (bot_plate_z0 + bot_plate_z1)/2])
                cylinder(d = bore_d, h = (bot_plate_z1 - bot_plate_z0) + 1.0,
                         center = true);
        }
        // four corner posts joining the plates
        for (sx = [-1, 1], sy = [-1, 1]) {
            translate([sx*post_cx - post_size/2, sy*post_cx - post_size/2, post_z0])
                cube([post_size, post_size, post_z1 - post_z0]);
        }
        // two symmetric rotation stops: single solid radial sector per side
        annular_sector(stop_r_in, stop_r_out, stop_pos_min, stop_pos_max,
                       stop_z0, stop_z1);
        annular_sector(stop_r_in, stop_r_out, stop_neg_min, stop_neg_max,
                       stop_z0, stop_z1);
    }
}

// ---------------- Part B : one-piece rotor ----------------
module part_rotor_B() {
    union() {
        // shaft
        translate([0, 0, (rotor_shaft_z0 + rotor_shaft_z1)/2])
            cylinder(d = shaft_d, h = rotor_shaft_z1 - rotor_shaft_z0, center = true);
        // lower cross-key
        box_xyz(-key_x, key_x, -key_y, key_y, key_z0, key_z1);
        // upper disc
        translate([0, 0, (disc_z0 + disc_z1)/2])
            cylinder(d = disc_d, h = disc_z1 - disc_z0, center = true);
        // handle (rectangular, straight end face flush within disc radius)
        box_xyz(0, handle_x1, -handle_y, handle_y, handle_z0, handle_z1);
    }
}

// Posed rotor: rigid rotation about Z by hinge_angle, plus axial offset.
function clamp(v, lo, hi) = min(max(v, lo), hi);

module rotor_at_working_pose() {
    ang = show_angle_clamp ? clamp(hinge_angle, -45, 45) : hinge_angle;
    translate([0, 0, axial_offset])
        rotate([0, 0, ang])
            part_rotor_B();
}

// ---------------- part selectors ----------------
agentscad_part = "all"; // "all" | "supportA" | "rotorB"

module generated_part() {
    if (agentscad_part == "supportA") {
        part_support_A();
    } else if (agentscad_part == "rotorB") {
        if (agentscad_pose) {
            rotor_at_working_pose();
        } else {
            part_rotor_B();
        }
    } else {
        part_support_A();
        rotor_at_working_pose();
    }
}

generated_part();
